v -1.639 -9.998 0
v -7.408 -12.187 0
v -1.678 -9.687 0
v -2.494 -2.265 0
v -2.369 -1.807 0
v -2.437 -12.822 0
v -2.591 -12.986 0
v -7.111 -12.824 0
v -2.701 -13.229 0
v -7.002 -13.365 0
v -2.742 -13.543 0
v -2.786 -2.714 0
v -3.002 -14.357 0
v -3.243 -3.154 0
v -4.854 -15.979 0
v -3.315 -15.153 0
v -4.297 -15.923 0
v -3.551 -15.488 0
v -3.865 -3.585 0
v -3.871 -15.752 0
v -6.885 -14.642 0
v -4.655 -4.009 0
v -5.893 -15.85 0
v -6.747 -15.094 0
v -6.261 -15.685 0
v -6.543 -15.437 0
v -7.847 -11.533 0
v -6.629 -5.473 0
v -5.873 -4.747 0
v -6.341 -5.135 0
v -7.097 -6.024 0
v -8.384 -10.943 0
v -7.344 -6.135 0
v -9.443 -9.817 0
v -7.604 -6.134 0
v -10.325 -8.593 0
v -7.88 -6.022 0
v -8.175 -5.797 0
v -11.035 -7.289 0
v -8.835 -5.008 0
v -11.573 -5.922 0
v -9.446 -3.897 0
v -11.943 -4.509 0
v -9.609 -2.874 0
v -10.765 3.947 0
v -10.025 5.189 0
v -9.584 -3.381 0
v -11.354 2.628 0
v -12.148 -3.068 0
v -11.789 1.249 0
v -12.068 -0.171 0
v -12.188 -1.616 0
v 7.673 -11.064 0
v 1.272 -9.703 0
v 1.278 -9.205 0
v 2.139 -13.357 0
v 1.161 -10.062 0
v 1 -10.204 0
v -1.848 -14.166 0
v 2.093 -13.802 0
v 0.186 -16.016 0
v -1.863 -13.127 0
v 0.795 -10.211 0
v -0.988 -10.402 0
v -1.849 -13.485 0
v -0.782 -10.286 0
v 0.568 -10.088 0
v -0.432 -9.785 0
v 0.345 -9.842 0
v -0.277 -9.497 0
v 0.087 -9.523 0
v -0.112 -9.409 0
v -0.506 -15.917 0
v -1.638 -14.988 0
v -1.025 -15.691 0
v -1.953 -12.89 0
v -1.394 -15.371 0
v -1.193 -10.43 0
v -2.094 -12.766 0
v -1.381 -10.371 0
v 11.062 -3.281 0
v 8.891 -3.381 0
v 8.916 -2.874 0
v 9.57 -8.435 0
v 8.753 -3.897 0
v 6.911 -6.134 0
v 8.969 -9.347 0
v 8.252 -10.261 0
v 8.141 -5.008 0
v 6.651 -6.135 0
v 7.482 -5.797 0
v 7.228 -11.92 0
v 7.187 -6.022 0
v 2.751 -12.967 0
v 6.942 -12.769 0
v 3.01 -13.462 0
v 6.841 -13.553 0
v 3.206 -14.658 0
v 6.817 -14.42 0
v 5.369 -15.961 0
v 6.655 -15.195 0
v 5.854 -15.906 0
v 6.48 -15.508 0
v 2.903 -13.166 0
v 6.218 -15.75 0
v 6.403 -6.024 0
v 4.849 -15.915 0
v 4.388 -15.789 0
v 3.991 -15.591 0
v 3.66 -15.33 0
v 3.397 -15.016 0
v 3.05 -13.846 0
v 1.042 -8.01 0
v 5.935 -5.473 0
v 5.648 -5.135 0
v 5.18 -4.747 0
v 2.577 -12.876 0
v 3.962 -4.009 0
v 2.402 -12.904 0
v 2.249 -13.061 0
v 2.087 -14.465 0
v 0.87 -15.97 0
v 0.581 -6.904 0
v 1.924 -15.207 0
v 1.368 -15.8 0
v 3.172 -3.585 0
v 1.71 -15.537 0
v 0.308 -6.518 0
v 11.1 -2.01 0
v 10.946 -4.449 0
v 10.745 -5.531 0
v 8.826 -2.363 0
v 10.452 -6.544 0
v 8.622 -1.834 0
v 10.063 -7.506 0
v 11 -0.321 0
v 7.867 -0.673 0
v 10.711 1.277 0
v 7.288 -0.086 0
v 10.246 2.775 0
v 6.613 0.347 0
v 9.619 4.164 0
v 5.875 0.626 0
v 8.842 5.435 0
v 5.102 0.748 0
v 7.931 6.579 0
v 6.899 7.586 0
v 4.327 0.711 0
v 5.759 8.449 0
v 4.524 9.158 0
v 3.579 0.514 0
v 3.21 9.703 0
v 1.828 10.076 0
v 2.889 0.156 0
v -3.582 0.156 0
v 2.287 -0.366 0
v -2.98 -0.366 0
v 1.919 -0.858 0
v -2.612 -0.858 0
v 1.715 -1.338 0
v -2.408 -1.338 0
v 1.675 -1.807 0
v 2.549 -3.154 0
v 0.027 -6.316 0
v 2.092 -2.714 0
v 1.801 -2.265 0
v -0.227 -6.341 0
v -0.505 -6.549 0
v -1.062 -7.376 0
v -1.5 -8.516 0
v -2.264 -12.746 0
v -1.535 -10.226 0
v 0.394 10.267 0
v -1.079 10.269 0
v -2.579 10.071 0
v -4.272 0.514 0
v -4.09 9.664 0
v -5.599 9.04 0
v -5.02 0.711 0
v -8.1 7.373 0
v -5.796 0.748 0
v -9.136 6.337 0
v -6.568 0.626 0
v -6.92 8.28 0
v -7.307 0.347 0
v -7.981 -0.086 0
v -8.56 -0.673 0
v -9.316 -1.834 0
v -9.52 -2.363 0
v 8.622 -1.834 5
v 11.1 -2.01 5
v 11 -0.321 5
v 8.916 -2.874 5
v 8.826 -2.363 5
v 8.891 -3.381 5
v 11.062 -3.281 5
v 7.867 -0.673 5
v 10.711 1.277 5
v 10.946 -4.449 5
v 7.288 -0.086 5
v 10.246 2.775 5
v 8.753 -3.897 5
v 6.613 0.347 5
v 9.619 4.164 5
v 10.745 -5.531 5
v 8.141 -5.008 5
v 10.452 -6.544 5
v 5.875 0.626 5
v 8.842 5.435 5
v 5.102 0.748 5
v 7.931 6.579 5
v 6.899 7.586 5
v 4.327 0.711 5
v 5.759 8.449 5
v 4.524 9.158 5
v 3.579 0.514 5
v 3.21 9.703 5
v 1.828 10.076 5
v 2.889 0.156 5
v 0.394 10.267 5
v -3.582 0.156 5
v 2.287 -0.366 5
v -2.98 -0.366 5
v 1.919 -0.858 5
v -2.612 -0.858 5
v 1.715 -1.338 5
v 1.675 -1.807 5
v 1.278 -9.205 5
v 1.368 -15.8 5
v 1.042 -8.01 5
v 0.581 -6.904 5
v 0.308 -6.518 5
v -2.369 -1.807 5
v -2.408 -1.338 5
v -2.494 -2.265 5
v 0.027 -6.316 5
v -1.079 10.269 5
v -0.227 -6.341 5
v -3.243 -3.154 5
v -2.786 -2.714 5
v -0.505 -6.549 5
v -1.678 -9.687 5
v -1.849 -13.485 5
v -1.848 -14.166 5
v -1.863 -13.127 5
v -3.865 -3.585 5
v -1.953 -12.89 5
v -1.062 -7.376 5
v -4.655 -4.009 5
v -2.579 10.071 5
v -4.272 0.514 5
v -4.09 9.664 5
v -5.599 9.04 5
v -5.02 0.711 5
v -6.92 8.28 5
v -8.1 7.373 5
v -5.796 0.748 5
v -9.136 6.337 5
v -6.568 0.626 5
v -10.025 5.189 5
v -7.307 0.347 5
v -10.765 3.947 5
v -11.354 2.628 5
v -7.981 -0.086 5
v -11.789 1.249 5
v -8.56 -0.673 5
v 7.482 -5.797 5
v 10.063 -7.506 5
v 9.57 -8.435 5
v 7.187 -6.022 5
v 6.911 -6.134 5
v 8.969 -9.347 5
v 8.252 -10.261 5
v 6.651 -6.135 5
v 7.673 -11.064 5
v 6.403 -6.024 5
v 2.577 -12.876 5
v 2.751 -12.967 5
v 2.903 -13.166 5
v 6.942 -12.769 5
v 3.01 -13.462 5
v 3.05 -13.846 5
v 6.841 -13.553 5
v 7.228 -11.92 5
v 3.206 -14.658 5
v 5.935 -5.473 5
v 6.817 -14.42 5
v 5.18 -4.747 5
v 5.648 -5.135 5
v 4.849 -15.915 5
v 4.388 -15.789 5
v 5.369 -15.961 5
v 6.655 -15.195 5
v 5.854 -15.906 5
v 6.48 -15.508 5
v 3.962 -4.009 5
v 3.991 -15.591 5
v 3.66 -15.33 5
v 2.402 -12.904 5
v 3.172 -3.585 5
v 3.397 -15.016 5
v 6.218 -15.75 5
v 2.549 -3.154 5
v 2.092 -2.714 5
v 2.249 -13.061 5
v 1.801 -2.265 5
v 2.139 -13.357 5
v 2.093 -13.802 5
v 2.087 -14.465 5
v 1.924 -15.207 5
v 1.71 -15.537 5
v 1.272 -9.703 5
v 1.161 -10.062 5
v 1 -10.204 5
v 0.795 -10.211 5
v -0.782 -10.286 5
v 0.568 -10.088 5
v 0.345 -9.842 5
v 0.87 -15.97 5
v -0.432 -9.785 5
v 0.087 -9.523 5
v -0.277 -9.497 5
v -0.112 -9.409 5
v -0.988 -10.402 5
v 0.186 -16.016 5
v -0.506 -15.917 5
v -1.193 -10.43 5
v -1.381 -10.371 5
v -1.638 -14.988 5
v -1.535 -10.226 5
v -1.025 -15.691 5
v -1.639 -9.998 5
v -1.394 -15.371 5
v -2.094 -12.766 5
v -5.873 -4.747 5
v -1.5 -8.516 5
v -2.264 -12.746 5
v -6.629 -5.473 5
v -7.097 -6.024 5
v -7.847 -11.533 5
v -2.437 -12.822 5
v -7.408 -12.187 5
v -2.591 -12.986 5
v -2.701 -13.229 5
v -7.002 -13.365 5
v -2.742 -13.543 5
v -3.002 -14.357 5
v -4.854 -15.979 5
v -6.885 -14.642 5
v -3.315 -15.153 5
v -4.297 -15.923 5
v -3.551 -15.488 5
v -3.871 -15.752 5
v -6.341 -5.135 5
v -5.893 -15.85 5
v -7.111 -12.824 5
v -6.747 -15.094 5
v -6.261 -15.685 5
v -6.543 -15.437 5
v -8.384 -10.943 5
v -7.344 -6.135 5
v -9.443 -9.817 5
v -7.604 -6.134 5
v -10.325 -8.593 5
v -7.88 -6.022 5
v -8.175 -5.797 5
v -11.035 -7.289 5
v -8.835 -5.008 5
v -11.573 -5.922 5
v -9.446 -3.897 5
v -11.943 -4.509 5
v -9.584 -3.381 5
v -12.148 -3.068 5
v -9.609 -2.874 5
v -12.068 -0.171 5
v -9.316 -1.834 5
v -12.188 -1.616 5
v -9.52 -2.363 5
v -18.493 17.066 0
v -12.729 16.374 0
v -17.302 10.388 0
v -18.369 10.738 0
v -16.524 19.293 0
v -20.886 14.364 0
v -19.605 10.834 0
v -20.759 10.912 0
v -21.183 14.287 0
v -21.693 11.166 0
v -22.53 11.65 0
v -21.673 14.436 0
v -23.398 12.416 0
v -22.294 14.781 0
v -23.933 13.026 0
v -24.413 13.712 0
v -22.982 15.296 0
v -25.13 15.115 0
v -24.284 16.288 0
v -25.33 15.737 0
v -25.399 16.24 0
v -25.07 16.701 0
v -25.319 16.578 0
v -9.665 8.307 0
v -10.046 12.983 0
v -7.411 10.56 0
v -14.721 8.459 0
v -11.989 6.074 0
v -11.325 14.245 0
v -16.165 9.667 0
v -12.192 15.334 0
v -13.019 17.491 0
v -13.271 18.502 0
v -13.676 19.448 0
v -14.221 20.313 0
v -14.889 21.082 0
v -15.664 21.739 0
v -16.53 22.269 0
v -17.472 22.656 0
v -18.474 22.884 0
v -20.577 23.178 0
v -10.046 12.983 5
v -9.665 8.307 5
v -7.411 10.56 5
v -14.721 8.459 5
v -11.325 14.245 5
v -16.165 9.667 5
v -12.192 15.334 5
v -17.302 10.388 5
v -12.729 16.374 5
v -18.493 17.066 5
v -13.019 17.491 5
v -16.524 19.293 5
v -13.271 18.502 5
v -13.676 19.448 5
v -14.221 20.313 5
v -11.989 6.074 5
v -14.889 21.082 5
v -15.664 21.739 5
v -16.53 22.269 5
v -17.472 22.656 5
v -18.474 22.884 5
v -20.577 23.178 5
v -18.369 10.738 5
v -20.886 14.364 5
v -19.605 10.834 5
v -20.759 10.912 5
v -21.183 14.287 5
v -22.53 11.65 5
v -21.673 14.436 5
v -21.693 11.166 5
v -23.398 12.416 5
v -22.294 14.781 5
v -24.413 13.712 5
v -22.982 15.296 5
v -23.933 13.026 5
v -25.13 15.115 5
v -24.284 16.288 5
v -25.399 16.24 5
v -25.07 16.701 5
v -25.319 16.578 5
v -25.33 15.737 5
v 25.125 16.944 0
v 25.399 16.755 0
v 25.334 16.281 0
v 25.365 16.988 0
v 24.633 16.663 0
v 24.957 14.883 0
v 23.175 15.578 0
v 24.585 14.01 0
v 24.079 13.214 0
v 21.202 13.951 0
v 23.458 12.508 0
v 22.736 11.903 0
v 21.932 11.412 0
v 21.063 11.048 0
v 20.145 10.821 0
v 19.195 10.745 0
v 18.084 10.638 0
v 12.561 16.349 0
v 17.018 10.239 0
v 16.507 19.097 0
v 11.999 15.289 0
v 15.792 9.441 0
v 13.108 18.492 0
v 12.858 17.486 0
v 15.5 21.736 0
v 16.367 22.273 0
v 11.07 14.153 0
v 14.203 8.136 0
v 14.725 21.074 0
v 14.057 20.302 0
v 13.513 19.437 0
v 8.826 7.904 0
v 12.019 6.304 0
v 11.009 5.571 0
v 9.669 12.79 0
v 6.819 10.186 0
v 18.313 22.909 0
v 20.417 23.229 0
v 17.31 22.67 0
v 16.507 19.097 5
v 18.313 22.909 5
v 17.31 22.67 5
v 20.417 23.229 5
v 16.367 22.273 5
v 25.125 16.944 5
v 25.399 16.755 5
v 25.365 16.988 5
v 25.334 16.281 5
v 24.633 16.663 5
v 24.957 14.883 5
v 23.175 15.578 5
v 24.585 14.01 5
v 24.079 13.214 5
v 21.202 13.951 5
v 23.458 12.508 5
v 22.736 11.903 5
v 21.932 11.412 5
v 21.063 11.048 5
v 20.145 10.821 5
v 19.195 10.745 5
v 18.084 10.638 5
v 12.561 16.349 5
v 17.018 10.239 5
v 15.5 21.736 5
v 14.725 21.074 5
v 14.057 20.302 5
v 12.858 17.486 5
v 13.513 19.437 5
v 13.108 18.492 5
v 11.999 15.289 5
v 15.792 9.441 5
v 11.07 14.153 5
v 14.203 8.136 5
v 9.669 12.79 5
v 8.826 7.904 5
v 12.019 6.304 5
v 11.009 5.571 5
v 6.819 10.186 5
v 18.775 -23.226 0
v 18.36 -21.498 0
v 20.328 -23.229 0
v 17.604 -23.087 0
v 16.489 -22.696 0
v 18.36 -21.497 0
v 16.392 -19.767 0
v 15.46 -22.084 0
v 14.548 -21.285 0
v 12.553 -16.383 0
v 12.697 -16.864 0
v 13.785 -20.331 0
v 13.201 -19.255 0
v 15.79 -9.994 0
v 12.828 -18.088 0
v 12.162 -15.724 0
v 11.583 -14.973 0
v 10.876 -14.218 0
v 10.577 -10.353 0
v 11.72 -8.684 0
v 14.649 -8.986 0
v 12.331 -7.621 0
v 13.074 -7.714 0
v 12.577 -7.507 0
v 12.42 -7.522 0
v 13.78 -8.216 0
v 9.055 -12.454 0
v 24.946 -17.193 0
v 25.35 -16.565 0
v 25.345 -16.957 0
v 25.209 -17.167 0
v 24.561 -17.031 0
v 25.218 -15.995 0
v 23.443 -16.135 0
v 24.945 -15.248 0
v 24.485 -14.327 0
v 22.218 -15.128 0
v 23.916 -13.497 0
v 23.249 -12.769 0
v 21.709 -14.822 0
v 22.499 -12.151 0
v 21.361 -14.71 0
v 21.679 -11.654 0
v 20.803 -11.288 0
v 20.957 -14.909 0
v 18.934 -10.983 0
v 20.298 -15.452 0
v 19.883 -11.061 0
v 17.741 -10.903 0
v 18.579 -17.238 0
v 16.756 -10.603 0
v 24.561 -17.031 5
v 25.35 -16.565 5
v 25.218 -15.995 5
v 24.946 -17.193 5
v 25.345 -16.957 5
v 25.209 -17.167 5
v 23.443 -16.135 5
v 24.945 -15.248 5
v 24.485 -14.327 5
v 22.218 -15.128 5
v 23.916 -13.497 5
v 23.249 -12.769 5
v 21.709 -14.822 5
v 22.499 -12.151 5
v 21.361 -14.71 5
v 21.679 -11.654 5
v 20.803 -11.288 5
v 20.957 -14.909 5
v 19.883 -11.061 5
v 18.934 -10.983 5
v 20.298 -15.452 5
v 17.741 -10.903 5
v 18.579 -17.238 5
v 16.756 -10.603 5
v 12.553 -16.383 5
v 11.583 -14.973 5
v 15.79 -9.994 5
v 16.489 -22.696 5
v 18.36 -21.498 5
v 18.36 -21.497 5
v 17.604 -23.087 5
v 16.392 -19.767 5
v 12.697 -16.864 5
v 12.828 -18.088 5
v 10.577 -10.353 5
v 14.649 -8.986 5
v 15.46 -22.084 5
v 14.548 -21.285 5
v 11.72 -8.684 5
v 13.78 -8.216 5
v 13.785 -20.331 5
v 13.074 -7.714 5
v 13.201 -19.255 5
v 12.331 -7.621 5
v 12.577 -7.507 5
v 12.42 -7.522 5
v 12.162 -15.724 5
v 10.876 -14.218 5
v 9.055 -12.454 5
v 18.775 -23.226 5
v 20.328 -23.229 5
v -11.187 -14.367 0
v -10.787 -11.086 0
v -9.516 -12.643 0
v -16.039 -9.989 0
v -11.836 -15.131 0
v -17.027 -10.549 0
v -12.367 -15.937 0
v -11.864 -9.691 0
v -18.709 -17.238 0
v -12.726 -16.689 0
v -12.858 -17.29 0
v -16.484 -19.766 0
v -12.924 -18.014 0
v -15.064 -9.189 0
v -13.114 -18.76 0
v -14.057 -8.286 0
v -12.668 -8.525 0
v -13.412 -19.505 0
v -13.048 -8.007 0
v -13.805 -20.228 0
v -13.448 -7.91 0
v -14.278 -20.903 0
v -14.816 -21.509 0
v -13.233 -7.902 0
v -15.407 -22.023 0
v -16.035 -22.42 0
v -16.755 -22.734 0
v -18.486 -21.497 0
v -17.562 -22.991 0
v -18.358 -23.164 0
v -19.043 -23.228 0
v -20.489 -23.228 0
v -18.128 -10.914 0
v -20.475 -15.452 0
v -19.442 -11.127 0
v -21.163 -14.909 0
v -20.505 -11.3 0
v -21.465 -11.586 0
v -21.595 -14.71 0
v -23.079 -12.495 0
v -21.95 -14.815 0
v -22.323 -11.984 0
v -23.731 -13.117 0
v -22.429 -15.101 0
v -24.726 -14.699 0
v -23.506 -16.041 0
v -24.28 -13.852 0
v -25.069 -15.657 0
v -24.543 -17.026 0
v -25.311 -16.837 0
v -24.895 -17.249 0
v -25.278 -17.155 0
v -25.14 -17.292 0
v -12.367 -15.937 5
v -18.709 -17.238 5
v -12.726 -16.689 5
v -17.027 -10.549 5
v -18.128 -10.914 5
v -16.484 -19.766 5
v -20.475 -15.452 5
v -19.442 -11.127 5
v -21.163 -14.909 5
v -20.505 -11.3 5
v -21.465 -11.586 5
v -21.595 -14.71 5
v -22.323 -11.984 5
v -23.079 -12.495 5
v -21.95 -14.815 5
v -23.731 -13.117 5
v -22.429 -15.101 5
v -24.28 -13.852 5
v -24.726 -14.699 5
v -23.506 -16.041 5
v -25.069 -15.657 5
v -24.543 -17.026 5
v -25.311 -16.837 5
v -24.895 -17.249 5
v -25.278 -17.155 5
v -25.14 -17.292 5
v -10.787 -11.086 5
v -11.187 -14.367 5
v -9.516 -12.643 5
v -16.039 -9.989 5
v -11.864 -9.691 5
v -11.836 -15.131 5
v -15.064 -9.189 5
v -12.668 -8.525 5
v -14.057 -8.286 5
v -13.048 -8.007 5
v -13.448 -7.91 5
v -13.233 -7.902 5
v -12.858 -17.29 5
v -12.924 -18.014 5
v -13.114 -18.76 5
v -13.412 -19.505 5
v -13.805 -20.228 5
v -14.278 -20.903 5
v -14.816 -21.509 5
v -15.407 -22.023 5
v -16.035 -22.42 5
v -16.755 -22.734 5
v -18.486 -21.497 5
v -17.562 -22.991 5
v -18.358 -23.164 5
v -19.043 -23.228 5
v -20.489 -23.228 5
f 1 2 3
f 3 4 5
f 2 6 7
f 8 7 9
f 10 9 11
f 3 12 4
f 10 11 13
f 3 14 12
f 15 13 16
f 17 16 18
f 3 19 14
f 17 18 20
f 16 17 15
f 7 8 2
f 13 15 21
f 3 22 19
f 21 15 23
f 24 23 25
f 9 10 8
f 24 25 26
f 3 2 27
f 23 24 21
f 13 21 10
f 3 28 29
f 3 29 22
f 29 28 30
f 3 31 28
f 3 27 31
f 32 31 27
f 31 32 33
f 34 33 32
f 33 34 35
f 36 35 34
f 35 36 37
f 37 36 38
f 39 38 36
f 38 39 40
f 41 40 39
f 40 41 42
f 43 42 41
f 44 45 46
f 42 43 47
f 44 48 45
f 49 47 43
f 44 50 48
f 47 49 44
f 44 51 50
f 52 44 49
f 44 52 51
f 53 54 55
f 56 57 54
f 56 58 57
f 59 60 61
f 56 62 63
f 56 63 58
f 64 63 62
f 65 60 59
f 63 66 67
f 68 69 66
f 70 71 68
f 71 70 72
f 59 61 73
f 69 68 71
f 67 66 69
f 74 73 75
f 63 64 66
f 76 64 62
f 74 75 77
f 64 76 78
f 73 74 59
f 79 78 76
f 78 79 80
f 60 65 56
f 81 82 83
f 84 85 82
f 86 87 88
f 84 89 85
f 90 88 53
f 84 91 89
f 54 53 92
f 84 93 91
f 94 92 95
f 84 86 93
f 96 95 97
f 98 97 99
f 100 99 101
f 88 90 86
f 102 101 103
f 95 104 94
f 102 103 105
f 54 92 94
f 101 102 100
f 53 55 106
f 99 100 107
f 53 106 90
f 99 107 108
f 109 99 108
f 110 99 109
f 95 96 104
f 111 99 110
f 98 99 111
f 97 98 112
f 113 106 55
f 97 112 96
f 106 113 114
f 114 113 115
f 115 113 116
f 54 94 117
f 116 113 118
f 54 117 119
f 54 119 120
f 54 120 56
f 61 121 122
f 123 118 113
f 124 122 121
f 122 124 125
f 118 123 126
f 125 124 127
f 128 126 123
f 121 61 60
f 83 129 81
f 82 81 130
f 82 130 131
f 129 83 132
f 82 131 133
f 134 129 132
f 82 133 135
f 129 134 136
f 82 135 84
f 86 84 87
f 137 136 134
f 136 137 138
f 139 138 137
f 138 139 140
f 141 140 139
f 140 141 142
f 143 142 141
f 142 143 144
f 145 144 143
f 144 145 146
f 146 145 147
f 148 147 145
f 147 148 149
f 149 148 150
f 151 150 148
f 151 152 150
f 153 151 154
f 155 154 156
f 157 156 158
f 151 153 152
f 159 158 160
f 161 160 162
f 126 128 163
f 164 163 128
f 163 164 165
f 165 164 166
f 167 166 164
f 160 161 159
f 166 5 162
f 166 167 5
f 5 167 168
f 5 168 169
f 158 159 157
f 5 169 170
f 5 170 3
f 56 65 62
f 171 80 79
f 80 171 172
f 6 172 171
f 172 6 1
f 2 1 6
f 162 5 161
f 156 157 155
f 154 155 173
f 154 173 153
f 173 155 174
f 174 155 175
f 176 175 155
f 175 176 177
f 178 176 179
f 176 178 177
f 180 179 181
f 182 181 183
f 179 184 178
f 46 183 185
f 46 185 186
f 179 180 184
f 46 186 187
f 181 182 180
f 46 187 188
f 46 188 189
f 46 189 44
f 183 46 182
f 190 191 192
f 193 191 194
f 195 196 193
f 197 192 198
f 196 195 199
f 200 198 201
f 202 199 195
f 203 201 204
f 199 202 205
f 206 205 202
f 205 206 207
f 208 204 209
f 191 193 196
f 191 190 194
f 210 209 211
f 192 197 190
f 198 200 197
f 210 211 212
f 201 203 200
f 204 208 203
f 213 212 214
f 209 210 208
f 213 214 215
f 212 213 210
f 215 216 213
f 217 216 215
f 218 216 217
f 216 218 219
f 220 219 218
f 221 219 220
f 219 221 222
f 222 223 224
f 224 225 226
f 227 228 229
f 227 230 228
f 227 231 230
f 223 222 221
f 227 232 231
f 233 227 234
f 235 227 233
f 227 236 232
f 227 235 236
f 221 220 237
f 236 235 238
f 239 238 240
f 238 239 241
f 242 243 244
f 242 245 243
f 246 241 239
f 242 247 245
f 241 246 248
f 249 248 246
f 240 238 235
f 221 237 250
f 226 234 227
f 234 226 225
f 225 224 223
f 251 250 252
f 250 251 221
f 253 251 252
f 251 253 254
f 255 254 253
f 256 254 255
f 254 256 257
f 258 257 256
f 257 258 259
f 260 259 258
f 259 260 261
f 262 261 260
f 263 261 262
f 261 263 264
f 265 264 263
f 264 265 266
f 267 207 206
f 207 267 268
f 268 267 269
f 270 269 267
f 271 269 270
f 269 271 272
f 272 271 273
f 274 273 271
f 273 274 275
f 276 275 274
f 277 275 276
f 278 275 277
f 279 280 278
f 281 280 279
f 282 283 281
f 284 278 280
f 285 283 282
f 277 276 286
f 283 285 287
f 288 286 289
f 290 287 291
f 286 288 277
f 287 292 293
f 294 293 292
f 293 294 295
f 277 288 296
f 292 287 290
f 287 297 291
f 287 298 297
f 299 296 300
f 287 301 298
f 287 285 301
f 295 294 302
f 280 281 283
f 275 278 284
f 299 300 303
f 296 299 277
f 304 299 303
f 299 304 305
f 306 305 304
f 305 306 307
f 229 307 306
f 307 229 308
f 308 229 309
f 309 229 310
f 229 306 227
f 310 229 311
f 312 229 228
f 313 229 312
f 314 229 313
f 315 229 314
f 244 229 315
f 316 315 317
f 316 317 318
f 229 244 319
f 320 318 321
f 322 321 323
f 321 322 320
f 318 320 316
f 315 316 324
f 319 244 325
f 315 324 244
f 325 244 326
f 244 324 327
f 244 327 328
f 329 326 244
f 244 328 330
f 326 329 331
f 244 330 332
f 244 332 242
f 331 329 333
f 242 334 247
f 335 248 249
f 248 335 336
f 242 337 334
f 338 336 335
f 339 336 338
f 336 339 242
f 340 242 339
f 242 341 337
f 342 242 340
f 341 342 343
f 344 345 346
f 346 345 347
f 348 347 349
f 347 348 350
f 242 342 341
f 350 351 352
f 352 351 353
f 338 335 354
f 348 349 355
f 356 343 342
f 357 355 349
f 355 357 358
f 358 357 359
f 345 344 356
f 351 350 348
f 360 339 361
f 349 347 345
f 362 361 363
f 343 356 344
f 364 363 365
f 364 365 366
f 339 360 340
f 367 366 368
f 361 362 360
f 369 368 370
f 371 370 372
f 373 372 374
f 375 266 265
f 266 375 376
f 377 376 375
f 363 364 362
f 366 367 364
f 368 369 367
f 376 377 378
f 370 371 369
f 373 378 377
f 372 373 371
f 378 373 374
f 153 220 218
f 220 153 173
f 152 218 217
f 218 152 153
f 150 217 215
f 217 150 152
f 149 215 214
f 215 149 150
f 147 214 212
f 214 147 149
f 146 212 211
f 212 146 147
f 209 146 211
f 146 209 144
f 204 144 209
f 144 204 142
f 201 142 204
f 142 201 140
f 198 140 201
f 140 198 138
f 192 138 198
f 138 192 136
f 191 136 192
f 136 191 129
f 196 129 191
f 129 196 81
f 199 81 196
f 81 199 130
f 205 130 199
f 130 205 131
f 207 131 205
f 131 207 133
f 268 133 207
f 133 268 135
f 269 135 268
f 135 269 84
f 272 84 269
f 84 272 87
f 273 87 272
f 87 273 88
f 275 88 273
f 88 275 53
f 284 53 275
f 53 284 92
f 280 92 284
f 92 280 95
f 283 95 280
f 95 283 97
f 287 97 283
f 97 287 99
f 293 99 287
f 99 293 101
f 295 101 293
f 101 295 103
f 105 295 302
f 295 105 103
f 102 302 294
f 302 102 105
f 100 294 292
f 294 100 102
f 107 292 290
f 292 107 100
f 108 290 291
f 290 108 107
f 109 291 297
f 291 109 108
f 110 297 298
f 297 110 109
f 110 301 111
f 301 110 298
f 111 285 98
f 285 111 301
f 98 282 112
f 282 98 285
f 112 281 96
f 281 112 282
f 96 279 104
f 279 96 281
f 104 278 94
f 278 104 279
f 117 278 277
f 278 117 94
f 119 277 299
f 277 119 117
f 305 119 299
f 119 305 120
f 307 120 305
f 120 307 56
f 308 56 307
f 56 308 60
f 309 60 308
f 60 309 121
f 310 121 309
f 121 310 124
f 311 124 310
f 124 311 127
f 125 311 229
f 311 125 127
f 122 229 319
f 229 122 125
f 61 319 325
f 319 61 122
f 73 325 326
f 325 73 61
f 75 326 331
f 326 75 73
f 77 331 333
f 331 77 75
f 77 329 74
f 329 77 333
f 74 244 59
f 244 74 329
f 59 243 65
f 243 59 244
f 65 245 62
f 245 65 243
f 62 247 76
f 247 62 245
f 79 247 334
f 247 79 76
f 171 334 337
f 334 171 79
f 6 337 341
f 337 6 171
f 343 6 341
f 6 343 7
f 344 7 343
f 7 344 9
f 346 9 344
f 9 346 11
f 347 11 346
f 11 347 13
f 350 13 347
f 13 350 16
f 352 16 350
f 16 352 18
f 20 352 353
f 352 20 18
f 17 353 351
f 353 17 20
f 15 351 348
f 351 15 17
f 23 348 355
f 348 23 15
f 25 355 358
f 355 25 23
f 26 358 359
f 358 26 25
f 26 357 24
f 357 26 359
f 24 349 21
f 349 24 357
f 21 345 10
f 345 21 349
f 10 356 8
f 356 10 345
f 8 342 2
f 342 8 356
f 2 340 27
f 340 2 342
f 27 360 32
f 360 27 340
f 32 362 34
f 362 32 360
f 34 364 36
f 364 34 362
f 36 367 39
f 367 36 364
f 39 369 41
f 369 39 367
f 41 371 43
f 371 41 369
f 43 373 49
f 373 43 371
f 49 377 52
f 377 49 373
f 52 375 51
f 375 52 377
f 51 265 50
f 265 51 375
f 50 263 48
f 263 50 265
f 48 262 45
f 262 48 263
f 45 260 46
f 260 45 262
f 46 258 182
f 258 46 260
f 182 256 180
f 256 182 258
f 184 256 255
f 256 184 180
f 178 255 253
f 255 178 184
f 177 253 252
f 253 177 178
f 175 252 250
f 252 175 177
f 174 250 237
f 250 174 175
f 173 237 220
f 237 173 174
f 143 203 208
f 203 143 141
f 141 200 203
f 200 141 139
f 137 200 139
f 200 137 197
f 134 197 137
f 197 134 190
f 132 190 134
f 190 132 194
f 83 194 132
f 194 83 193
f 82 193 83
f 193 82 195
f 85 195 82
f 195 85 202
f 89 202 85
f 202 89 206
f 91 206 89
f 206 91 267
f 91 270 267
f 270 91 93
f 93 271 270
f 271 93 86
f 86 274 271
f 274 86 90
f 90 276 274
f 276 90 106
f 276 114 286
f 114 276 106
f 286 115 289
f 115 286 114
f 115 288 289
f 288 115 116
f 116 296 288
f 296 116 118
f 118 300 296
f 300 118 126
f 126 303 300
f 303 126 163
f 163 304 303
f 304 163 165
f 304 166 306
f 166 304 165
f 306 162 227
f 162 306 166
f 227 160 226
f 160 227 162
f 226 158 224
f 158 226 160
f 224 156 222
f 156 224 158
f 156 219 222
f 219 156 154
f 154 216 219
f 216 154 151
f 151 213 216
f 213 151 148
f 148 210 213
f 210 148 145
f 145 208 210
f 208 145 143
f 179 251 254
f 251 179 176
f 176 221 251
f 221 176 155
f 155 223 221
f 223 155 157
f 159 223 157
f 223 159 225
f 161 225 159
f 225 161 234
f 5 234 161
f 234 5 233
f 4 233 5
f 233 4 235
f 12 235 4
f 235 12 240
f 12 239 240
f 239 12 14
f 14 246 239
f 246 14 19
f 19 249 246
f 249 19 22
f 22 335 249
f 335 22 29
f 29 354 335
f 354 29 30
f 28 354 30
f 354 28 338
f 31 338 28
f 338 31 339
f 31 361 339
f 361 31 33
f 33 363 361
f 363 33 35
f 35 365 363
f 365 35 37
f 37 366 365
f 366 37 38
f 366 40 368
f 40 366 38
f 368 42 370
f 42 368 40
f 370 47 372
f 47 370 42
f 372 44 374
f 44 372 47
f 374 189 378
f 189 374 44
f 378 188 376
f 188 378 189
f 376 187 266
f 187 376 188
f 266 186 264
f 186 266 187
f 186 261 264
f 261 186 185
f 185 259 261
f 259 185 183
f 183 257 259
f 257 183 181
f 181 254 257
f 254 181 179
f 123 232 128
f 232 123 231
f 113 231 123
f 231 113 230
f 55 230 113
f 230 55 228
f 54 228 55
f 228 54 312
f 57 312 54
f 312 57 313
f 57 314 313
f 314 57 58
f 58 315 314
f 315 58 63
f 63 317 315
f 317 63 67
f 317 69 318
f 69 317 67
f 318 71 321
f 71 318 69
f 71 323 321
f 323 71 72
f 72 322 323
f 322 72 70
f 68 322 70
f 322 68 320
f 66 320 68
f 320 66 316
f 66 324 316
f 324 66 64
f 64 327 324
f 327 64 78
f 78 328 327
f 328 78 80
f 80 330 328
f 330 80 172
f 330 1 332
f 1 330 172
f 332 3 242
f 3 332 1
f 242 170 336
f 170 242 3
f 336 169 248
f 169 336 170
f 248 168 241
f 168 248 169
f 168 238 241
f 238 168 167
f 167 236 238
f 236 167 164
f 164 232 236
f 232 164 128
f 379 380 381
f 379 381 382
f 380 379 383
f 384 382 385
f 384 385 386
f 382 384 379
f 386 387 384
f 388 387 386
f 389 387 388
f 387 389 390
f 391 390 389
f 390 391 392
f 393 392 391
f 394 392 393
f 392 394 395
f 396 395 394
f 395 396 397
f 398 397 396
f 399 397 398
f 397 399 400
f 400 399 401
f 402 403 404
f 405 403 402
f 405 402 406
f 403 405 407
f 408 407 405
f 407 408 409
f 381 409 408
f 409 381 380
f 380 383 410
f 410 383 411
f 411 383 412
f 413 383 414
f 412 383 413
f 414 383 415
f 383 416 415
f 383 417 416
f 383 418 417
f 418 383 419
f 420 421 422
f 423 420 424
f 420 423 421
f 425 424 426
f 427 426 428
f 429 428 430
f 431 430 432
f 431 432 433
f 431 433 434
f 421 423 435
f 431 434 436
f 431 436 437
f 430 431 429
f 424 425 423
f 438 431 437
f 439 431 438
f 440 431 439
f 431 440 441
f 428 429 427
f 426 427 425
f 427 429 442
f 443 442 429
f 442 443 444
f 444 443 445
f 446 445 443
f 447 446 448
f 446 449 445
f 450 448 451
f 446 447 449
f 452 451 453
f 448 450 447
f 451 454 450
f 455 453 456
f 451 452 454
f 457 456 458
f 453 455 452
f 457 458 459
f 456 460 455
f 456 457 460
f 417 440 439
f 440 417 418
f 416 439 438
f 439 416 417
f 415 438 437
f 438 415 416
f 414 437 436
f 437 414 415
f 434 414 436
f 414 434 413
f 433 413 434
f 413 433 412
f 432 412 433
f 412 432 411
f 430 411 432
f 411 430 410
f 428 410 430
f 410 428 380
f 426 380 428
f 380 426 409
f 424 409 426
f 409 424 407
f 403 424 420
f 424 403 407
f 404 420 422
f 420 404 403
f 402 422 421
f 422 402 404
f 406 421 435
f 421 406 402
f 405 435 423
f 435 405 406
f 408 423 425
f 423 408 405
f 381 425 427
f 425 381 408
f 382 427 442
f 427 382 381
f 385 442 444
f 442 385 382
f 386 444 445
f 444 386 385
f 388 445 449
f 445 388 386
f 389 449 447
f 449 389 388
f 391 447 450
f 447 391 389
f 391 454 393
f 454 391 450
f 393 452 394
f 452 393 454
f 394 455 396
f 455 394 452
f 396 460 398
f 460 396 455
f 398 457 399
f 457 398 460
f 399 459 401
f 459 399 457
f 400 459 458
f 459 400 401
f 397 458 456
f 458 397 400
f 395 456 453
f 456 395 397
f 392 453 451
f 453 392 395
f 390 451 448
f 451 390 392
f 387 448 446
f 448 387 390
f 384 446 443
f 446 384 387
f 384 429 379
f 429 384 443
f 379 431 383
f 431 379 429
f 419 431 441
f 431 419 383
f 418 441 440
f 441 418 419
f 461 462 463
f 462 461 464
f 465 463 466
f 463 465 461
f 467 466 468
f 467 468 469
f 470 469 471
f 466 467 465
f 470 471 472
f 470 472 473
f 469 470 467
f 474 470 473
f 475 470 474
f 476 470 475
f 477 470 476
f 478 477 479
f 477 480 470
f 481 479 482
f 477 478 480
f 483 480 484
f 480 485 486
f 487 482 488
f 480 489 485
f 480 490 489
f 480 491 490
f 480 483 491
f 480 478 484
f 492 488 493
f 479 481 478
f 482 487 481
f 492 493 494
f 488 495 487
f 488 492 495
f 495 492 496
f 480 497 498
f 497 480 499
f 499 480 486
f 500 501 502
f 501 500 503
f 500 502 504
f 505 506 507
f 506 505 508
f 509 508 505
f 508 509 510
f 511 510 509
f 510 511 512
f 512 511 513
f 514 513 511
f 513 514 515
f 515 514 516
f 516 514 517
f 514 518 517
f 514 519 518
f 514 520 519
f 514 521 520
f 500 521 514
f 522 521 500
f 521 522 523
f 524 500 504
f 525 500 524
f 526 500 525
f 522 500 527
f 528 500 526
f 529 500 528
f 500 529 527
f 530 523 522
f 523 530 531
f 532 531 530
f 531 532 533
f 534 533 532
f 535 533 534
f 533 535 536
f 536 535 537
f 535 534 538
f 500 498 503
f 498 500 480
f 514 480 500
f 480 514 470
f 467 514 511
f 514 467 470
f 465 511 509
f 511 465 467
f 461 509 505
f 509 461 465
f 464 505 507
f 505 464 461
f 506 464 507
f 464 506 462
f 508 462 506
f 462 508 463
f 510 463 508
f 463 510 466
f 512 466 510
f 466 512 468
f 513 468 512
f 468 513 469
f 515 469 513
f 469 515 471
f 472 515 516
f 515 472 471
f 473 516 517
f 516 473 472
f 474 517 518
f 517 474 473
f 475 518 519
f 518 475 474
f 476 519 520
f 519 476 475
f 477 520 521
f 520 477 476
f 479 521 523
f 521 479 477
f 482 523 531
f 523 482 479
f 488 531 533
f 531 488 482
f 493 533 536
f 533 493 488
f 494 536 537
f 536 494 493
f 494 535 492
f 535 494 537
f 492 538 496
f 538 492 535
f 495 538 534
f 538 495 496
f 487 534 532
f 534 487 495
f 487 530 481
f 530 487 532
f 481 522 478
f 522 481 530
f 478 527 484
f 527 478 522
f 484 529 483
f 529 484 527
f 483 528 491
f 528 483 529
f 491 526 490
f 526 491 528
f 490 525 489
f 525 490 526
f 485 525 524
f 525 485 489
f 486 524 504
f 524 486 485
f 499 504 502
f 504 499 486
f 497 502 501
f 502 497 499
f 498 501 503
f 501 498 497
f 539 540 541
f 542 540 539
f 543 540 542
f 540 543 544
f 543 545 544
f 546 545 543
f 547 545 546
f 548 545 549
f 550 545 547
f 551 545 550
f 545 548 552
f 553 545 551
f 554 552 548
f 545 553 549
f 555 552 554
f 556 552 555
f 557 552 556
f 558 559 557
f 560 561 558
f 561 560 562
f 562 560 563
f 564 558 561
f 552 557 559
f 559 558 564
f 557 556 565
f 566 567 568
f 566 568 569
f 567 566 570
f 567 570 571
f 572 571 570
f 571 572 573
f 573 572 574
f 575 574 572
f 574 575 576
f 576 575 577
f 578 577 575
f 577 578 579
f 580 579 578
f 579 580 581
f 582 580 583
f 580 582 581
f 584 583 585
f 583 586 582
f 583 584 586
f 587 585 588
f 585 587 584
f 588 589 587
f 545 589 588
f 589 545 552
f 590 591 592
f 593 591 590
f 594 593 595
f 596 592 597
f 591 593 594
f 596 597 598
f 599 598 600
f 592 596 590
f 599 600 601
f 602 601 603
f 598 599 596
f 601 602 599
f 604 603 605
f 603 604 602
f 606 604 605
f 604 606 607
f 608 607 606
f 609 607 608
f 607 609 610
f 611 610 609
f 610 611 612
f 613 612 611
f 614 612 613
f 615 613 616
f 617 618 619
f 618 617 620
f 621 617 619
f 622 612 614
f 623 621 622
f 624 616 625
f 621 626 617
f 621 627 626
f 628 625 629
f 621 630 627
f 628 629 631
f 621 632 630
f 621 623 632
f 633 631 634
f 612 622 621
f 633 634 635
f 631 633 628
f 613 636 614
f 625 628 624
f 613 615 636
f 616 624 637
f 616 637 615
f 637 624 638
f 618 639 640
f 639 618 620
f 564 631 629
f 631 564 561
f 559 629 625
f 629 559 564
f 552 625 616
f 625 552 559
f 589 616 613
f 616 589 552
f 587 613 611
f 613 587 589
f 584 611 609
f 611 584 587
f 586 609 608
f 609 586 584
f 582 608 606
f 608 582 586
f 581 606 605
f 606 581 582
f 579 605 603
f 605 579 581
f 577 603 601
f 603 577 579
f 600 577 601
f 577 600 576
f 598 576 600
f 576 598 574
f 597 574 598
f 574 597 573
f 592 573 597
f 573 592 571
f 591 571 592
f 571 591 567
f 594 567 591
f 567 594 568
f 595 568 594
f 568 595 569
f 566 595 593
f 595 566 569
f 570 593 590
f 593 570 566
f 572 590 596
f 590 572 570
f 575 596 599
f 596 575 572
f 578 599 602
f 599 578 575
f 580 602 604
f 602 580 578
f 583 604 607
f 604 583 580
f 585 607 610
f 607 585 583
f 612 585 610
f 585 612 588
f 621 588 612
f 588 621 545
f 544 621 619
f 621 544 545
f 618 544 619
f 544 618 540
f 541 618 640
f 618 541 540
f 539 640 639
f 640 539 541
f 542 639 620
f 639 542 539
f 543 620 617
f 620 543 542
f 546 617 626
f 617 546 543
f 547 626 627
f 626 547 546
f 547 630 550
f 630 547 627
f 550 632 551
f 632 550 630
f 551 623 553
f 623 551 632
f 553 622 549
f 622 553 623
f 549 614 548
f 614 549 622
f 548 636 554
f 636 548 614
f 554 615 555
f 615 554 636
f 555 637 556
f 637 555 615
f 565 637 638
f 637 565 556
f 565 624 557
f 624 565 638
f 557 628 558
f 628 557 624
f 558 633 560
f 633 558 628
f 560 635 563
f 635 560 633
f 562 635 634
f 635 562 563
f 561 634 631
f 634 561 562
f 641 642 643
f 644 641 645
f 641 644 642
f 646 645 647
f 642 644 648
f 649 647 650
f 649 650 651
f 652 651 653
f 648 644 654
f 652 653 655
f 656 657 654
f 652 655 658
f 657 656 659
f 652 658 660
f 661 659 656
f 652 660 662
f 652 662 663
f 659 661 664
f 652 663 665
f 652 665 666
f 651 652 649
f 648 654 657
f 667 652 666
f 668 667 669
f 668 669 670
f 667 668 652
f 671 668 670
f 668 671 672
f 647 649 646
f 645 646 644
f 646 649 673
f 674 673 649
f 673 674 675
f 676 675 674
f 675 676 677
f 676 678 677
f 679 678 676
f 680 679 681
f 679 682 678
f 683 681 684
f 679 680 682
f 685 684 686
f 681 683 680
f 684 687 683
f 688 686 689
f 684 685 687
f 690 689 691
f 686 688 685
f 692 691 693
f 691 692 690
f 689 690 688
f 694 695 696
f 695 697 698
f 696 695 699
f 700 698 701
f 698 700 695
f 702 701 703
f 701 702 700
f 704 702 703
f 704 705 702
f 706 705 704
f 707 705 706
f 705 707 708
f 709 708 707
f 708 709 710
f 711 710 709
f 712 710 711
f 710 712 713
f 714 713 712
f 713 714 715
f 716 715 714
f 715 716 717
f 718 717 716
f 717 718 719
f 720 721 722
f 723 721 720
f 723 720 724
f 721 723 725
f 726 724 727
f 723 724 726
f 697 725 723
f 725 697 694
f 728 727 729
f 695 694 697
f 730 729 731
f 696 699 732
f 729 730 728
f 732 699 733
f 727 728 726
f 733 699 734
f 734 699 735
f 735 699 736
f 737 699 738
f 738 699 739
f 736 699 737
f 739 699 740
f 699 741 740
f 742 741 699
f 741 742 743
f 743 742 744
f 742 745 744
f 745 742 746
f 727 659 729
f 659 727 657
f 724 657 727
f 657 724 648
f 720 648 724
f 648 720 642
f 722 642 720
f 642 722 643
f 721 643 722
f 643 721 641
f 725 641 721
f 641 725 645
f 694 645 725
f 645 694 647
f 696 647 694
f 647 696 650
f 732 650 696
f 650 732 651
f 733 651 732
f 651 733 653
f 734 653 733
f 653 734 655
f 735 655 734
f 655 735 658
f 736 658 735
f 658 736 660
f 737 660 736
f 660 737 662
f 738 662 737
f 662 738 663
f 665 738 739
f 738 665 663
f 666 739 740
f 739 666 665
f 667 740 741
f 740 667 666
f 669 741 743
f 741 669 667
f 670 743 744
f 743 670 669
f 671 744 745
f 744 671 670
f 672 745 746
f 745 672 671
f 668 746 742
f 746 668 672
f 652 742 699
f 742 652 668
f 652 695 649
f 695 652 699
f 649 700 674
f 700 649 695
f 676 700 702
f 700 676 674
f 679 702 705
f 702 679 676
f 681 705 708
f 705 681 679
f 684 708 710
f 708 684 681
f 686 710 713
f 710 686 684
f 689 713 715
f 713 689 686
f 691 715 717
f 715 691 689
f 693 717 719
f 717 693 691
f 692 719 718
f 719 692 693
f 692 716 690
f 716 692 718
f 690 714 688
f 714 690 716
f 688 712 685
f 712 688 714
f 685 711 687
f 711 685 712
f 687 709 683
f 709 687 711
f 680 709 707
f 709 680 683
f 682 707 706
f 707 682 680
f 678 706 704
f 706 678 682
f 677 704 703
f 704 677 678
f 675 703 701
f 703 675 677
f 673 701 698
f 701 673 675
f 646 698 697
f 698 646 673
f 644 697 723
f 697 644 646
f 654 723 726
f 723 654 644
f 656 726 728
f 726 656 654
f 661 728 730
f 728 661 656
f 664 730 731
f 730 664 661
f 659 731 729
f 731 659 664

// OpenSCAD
//
// Brian Benchoff at HackADay, noted there was no Hack A Day logo to play with the new makerbot Customizer tool in a post at: 
//   http://www.hackaday.com/2013/02/16/custom-3d-printed-designs-with-makerbots-customizer
//
// I built this to play around. Currently DXF import is unsupported by http://customizer.makerbot.com
// 
// Here is the highlevel of how I did it and the tools used:
//
// Downloaded Hack a Day logo from http://hackaday.com
// Imported into Inkscape, traced, cleaned up, set stroke and fill to black, set path name, set Doc Defaults to mm, scaled to ~50mm.
// Exported to OpenScad Format with Inkscape to OpenSCAD converter v2 from:
//   http://www.thingiverse.com/thing:25036
// Hand edited the OpenScad output to add Variables and make nice for Customizer!
//
// -- BoorT


// Module names are of the form poly_<inkscape-path-id>().  As a result,
// you can associate a polygon in this OpenSCAD program with the corresponding
// SVG element in the Inkscape document by looking for the XML element with
// the attribute id="inkscape-path-id".

// preview[view:south, tilt:top]

// How Wide to make the Logo?   Default is 1 which is about 50mm square. Choose 2 for twice as wide.
LogoScaleX=1; //

// How High to make the Logo?   Default is 1 which is about 50mm square. Choose 2 for twice as high.
LogoScaleY=1; //

// How tall to make the Logo?   Default is 5mm 
ExtrudeHeight = 5; // [.5:50]

// What color would you like: Default is Green. See http://en.wikipedia.org/wiki/Web_colors for valid options.
LogoColor = "green"; 

// The fudge value is used to ensure that subtracted solids are a tad taller in the z dimension than the polygon being  subtracted from.  This helps keep the resulting .stl file manifold. Defualt of 0.1mm should work for most uses.
fudge = 0.1; // [0.1:1]

module poly_HackADayLogo(h)
{
  scale([25.4/90, -25.4/90, 1]) union()
  {
    linear_extrude(height=h)
      polygon([[-34.245637,-29.433885],[-26.261107,-37.418335],[-35.596937,-46.002585],[-40.128276,-50.474831],[-43.199657,-54.332354],[-45.103423,-58.018425],[-46.131917,-61.976315],[-47.021502,-65.557463],[-48.459276,-68.908636],[-50.389209,-71.974442],[-52.755268,-74.699486],[-55.501423,-77.028375],[-58.571640,-78.905716],[-61.909889,-80.276114],[-65.460137,-81.084175],[-72.912299,-82.125795],[-65.730667,-75.243785],[-58.549047,-68.361755],[-65.524687,-60.468455],[-74.007293,-50.896895],[-75.057492,-50.624528],[-76.793965,-51.150160],[-78.993311,-52.374462],[-81.432125,-54.198105],[-86.046363,-57.714861],[-88.830039,-59.177585],[-89.712158,-58.740916],[-89.997226,-57.544865],[-89.751947,-55.760365],[-89.043023,-53.558351],[-86.501051,-48.585515],[-84.801409,-46.156559],[-82.904932,-43.993825],[-79.831674,-41.280832],[-76.863311,-39.565664],[-73.556015,-38.663194],[-69.465957,-38.388295],[-65.086361,-38.049234],[-61.305237,-36.807219],[-57.278391,-34.251652],[-52.161627,-29.971935],[-42.479837,-21.521895],[-34.245637,-29.433885]]);
    linear_extrude(height=h)
      polygon([[50.325821,-28.828675],[55.957113,-33.450676],[60.299203,-36.279533],[64.076488,-37.693810],[68.013361,-38.072075],[71.378186,-38.342122],[74.631190,-39.145109],[77.712163,-40.437796],[80.560892,-42.176943],[83.117167,-44.319306],[85.320776,-46.821647],[87.111507,-49.640724],[88.429151,-52.733295],[89.765511,-57.687719],[89.997226,-59.369685],[89.874721,-60.195035],[89.026068,-60.037145],[87.280642,-59.041989],[82.117611,-55.195985],[75.125141,-49.432265],[66.806471,-58.549335],[58.487771,-67.666425],[65.415061,-74.986215],[72.342351,-82.306025],[64.890181,-81.174295],[61.334333,-80.325112],[57.992543,-78.921395],[54.920558,-77.018562],[52.174127,-74.672031],[49.808996,-71.937220],[47.880913,-68.869547],[46.445626,-65.524429],[45.558881,-61.957285],[44.506993,-57.928705],[42.517242,-54.172484],[39.223453,-50.149486],[34.259451,-45.320575],[24.162271,-36.092395],[31.274481,-28.005385],[39.007281,-19.740695],[42.588068,-22.337006],[50.325821,-28.828675]]);
    difference()
    {
       linear_extrude(height=h)
         polygon([[-9.717087,47.988025],[-9.568745,46.875196],[-9.180220,46.013970],[-8.636261,45.433837],[-8.021618,45.164287],[-7.421043,45.234811],[-6.919284,45.674898],[-6.601092,46.514040],[-6.551217,47.781725],[-6.549053,50.195964],[-5.804445,53.108137],[-4.939182,54.463703],[-3.630858,55.599055],[-1.793655,56.399295],[0.658243,56.749525],[3.082099,56.585008],[4.847189,55.985106],[6.057338,55.050958],[6.816372,53.883700],[7.396395,51.254406],[7.417863,48.906325],[7.577543,47.327482],[7.968219,46.278839],[8.512131,45.723586],[9.131519,45.624912],[9.748625,45.946010],[10.285689,46.650067],[10.664950,47.700276],[10.808651,49.059825],[11.361433,51.938053],[12.037702,53.206860],[12.967483,54.318975],[14.140970,55.242034],[15.548357,55.943672],[17.179839,56.391524],[19.025611,56.553225],[20.742303,56.361605],[22.033485,55.808250],[22.959758,54.949045],[23.581723,53.839875],[24.155138,51.095175],[24.238541,48.021225],[24.596453,45.244995],[25.609800,42.234962],[27.188000,39.202336],[29.240471,36.358325],[31.779553,33.120117],[33.910820,29.886715],[35.655621,26.596251],[37.035308,23.186857],[38.071232,19.596668],[38.784743,15.763816],[39.197192,11.626434],[39.329931,7.122655],[38.977710,1.138705],[37.953338,-4.523229],[36.305249,-9.831098],[34.081878,-14.752852],[31.331661,-19.256440],[28.103032,-23.309814],[24.444427,-26.880922],[20.404281,-29.937716],[16.031027,-32.448146],[11.373103,-34.380161],[6.478941,-35.701711],[1.396979,-36.380748],[-3.824351,-36.385220],[-9.136611,-35.683079],[-14.491369,-34.242274],[-19.840187,-32.030755],[-24.521238,-29.338392],[-28.700709,-26.125628],[-32.369959,-22.454467],[-35.520345,-18.386913],[-38.143227,-13.984971],[-40.229963,-9.310644],[-41.771910,-4.425937],[-42.760428,0.607146],[-43.186876,5.726601],[-43.042610,10.870422],[-42.318991,15.976607],[-41.007376,20.983150],[-39.099123,25.828048],[-36.585592,30.449296],[-33.458141,34.784890],[-29.708127,38.772825],[-27.805685,40.864942],[-26.247753,43.180587],[-25.195098,45.438127],[-24.808487,47.355925],[-24.396732,51.880802],[-23.908060,53.481506],[-23.182963,54.699362],[-22.185522,55.578102],[-20.879814,56.161455],[-17.199917,56.616925],[-15.226510,56.420608],[-13.715190,55.815042],[-12.583206,54.878809],[-11.747808,53.690487],[-10.635774,50.871902],[-9.717087,47.987925]]);
       translate([0, 0, -fudge])
         linear_extrude(height=h+2*fudge)
           polygon([[21.031031,19.393105],[20.012468,18.196454],[18.354321,16.819486],[14.037211,14.205495],[11.240257,12.703217],[9.032853,11.174221],[7.413837,9.615983],[6.382051,8.025982],[5.936335,6.401696],[6.075530,4.740603],[6.798476,3.040180],[8.104013,1.297905],[10.235055,-0.551777],[12.680187,-1.822225],[15.330971,-2.519401],[18.078975,-2.649269],[20.815762,-2.217791],[23.432897,-1.230930],[25.821945,0.305349],[27.874471,2.385085],[30.551567,6.499975],[31.274293,8.372375],[31.590402,10.183461],[31.502843,11.979771],[31.014564,13.807841],[28.847641,17.745415],[26.510311,20.541054],[25.464749,21.337188],[24.486692,21.735269],[23.565215,21.737598],[22.689395,21.346480],[21.031031,19.393105]]);
       translate([0, 0, -fudge])
         linear_extrude(height=h+2*fudge)
           polygon([[-31.304007,17.745415],[-33.470932,13.807841],[-33.959212,11.979771],[-34.046772,10.183461],[-33.730664,8.372375],[-33.007938,6.499975],[-30.330837,2.385085],[-28.278317,0.305349],[-25.889273,-1.230930],[-23.272139,-2.217791],[-20.535352,-2.649269],[-17.787347,-2.519401],[-15.136559,-1.822225],[-12.691424,-0.551777],[-10.560377,1.297905],[-9.254841,3.040180],[-8.531896,4.740603],[-8.392703,6.401696],[-8.838420,8.025982],[-9.870206,9.615983],[-11.489222,11.174221],[-13.696626,12.703217],[-16.493577,14.205495],[-20.810687,16.819486],[-22.468835,18.196454],[-23.487397,19.393105],[-25.145761,21.346480],[-26.021581,21.737598],[-26.943058,21.735269],[-27.921116,21.337188],[-28.966677,20.541054],[-31.304007,17.745415]]);
       translate([0, 0, -fudge])
         linear_extrude(height=h+2*fudge)
           polygon([[-5.944247,34.322425],[-5.314545,30.174909],[-3.761738,26.136832],[-1.790276,23.205737],[-0.805189,22.467040],[0.095393,22.379165],[1.090800,23.096398],[2.060227,24.462153],[3.691414,28.380556],[4.529500,32.617029],[4.507551,34.380371],[4.115033,35.654225],[3.543999,36.157431],[2.815473,36.179775],[2.013477,35.743944],[1.222033,34.872625],[0.308298,33.743859],[-0.397633,33.338225],[-0.981489,33.649441],[-1.528997,34.671225],[-2.771148,36.446003],[-3.501289,36.856548],[-4.227527,36.955250],[-4.892402,36.746649],[-5.438454,36.235284],[-5.808222,35.425696],[-5.944247,34.322425]]);
    }
    linear_extrude(height=h)
      polygon([[65.055381,76.172225],[58.083021,70.041325],[65.831051,61.080925],[71.922358,54.752650],[74.257270,52.827559],[75.687151,52.120525],[76.921587,52.519003],[78.724361,53.603975],[83.066391,57.170625],[87.027424,60.346466],[88.392209,60.919262],[89.324085,60.828550],[89.806235,60.084260],[89.821846,58.696322],[89.354099,56.674667],[88.386181,54.029225],[86.759258,50.763643],[84.741099,47.823558],[82.379442,45.242847],[79.722025,43.055387],[76.816583,41.295058],[73.710855,39.995736],[70.452579,39.191299],[67.089491,38.915625],[62.860811,38.631619],[59.373298,37.568775],[55.948264,35.410856],[51.907021,31.841625],[48.826105,29.110067],[46.325870,27.331666],[44.562890,26.598662],[44.006801,26.653009],[43.693741,27.003295],[41.527923,30.768887],[37.477611,36.682825],[32.085311,44.126625],[38.537251,50.380025],[41.042421,53.054408],[43.093940,55.713387],[44.480101,58.049361],[44.989201,59.754725],[45.454185,64.091820],[46.775724,68.225312],[48.843694,72.039943],[51.547976,75.420450],[54.778446,78.251573],[58.424983,80.418050],[62.377465,81.804621],[66.525771,82.296025],[72.027731,82.306025],[65.055381,76.175125]]);
    linear_extrude(height=h)
      polygon([[-56.815957,79.441525],[-54.591631,78.033304],[-52.499413,76.214536],[-50.589995,74.067078],[-48.914070,71.672787],[-47.522330,69.113520],[-46.465468,66.471133],[-45.794176,63.827482],[-45.559147,61.264425],[-45.091945,59.132845],[-43.819857,56.469562],[-41.937165,53.614411],[-39.638147,50.907225],[-33.717137,44.798425],[-38.223337,39.280125],[-42.039476,34.338837],[-44.886637,30.207925],[-46.231599,28.370215],[-46.889618,27.999901],[-47.649343,28.026116],[-49.807962,29.360647],[-53.375547,32.558825],[-56.832517,35.395111],[-60.332556,37.379762],[-64.232673,38.670795],[-68.889877,39.426225],[-72.655448,40.039614],[-76.058572,41.052089],[-79.098563,42.463097],[-81.774733,44.272087],[-84.086395,46.478507],[-86.032861,49.081805],[-87.613443,52.081428],[-88.827454,55.476825],[-89.682935,59.659502],[-89.566044,60.786352],[-89.077811,61.272237],[-88.212044,61.118678],[-86.962553,60.327192],[-83.287631,56.836525],[-79.471072,53.505850],[-77.775000,52.492647],[-76.516633,52.120525],[-74.985704,52.827333],[-72.547486,54.751812],[-66.291267,61.078125],[-58.406397,70.035725],[-65.502047,76.169425],[-72.597681,82.303025],[-67.473647,82.303025],[-65.047435,82.077231],[-62.229278,81.462450],[-59.368884,80.552581],[-56.815957,79.441525]]);
  }
}

scale([LogoScaleX, LogoScaleY , 1])
color(LogoColor)
poly_HackADayLogo(ExtrudeHeight);
